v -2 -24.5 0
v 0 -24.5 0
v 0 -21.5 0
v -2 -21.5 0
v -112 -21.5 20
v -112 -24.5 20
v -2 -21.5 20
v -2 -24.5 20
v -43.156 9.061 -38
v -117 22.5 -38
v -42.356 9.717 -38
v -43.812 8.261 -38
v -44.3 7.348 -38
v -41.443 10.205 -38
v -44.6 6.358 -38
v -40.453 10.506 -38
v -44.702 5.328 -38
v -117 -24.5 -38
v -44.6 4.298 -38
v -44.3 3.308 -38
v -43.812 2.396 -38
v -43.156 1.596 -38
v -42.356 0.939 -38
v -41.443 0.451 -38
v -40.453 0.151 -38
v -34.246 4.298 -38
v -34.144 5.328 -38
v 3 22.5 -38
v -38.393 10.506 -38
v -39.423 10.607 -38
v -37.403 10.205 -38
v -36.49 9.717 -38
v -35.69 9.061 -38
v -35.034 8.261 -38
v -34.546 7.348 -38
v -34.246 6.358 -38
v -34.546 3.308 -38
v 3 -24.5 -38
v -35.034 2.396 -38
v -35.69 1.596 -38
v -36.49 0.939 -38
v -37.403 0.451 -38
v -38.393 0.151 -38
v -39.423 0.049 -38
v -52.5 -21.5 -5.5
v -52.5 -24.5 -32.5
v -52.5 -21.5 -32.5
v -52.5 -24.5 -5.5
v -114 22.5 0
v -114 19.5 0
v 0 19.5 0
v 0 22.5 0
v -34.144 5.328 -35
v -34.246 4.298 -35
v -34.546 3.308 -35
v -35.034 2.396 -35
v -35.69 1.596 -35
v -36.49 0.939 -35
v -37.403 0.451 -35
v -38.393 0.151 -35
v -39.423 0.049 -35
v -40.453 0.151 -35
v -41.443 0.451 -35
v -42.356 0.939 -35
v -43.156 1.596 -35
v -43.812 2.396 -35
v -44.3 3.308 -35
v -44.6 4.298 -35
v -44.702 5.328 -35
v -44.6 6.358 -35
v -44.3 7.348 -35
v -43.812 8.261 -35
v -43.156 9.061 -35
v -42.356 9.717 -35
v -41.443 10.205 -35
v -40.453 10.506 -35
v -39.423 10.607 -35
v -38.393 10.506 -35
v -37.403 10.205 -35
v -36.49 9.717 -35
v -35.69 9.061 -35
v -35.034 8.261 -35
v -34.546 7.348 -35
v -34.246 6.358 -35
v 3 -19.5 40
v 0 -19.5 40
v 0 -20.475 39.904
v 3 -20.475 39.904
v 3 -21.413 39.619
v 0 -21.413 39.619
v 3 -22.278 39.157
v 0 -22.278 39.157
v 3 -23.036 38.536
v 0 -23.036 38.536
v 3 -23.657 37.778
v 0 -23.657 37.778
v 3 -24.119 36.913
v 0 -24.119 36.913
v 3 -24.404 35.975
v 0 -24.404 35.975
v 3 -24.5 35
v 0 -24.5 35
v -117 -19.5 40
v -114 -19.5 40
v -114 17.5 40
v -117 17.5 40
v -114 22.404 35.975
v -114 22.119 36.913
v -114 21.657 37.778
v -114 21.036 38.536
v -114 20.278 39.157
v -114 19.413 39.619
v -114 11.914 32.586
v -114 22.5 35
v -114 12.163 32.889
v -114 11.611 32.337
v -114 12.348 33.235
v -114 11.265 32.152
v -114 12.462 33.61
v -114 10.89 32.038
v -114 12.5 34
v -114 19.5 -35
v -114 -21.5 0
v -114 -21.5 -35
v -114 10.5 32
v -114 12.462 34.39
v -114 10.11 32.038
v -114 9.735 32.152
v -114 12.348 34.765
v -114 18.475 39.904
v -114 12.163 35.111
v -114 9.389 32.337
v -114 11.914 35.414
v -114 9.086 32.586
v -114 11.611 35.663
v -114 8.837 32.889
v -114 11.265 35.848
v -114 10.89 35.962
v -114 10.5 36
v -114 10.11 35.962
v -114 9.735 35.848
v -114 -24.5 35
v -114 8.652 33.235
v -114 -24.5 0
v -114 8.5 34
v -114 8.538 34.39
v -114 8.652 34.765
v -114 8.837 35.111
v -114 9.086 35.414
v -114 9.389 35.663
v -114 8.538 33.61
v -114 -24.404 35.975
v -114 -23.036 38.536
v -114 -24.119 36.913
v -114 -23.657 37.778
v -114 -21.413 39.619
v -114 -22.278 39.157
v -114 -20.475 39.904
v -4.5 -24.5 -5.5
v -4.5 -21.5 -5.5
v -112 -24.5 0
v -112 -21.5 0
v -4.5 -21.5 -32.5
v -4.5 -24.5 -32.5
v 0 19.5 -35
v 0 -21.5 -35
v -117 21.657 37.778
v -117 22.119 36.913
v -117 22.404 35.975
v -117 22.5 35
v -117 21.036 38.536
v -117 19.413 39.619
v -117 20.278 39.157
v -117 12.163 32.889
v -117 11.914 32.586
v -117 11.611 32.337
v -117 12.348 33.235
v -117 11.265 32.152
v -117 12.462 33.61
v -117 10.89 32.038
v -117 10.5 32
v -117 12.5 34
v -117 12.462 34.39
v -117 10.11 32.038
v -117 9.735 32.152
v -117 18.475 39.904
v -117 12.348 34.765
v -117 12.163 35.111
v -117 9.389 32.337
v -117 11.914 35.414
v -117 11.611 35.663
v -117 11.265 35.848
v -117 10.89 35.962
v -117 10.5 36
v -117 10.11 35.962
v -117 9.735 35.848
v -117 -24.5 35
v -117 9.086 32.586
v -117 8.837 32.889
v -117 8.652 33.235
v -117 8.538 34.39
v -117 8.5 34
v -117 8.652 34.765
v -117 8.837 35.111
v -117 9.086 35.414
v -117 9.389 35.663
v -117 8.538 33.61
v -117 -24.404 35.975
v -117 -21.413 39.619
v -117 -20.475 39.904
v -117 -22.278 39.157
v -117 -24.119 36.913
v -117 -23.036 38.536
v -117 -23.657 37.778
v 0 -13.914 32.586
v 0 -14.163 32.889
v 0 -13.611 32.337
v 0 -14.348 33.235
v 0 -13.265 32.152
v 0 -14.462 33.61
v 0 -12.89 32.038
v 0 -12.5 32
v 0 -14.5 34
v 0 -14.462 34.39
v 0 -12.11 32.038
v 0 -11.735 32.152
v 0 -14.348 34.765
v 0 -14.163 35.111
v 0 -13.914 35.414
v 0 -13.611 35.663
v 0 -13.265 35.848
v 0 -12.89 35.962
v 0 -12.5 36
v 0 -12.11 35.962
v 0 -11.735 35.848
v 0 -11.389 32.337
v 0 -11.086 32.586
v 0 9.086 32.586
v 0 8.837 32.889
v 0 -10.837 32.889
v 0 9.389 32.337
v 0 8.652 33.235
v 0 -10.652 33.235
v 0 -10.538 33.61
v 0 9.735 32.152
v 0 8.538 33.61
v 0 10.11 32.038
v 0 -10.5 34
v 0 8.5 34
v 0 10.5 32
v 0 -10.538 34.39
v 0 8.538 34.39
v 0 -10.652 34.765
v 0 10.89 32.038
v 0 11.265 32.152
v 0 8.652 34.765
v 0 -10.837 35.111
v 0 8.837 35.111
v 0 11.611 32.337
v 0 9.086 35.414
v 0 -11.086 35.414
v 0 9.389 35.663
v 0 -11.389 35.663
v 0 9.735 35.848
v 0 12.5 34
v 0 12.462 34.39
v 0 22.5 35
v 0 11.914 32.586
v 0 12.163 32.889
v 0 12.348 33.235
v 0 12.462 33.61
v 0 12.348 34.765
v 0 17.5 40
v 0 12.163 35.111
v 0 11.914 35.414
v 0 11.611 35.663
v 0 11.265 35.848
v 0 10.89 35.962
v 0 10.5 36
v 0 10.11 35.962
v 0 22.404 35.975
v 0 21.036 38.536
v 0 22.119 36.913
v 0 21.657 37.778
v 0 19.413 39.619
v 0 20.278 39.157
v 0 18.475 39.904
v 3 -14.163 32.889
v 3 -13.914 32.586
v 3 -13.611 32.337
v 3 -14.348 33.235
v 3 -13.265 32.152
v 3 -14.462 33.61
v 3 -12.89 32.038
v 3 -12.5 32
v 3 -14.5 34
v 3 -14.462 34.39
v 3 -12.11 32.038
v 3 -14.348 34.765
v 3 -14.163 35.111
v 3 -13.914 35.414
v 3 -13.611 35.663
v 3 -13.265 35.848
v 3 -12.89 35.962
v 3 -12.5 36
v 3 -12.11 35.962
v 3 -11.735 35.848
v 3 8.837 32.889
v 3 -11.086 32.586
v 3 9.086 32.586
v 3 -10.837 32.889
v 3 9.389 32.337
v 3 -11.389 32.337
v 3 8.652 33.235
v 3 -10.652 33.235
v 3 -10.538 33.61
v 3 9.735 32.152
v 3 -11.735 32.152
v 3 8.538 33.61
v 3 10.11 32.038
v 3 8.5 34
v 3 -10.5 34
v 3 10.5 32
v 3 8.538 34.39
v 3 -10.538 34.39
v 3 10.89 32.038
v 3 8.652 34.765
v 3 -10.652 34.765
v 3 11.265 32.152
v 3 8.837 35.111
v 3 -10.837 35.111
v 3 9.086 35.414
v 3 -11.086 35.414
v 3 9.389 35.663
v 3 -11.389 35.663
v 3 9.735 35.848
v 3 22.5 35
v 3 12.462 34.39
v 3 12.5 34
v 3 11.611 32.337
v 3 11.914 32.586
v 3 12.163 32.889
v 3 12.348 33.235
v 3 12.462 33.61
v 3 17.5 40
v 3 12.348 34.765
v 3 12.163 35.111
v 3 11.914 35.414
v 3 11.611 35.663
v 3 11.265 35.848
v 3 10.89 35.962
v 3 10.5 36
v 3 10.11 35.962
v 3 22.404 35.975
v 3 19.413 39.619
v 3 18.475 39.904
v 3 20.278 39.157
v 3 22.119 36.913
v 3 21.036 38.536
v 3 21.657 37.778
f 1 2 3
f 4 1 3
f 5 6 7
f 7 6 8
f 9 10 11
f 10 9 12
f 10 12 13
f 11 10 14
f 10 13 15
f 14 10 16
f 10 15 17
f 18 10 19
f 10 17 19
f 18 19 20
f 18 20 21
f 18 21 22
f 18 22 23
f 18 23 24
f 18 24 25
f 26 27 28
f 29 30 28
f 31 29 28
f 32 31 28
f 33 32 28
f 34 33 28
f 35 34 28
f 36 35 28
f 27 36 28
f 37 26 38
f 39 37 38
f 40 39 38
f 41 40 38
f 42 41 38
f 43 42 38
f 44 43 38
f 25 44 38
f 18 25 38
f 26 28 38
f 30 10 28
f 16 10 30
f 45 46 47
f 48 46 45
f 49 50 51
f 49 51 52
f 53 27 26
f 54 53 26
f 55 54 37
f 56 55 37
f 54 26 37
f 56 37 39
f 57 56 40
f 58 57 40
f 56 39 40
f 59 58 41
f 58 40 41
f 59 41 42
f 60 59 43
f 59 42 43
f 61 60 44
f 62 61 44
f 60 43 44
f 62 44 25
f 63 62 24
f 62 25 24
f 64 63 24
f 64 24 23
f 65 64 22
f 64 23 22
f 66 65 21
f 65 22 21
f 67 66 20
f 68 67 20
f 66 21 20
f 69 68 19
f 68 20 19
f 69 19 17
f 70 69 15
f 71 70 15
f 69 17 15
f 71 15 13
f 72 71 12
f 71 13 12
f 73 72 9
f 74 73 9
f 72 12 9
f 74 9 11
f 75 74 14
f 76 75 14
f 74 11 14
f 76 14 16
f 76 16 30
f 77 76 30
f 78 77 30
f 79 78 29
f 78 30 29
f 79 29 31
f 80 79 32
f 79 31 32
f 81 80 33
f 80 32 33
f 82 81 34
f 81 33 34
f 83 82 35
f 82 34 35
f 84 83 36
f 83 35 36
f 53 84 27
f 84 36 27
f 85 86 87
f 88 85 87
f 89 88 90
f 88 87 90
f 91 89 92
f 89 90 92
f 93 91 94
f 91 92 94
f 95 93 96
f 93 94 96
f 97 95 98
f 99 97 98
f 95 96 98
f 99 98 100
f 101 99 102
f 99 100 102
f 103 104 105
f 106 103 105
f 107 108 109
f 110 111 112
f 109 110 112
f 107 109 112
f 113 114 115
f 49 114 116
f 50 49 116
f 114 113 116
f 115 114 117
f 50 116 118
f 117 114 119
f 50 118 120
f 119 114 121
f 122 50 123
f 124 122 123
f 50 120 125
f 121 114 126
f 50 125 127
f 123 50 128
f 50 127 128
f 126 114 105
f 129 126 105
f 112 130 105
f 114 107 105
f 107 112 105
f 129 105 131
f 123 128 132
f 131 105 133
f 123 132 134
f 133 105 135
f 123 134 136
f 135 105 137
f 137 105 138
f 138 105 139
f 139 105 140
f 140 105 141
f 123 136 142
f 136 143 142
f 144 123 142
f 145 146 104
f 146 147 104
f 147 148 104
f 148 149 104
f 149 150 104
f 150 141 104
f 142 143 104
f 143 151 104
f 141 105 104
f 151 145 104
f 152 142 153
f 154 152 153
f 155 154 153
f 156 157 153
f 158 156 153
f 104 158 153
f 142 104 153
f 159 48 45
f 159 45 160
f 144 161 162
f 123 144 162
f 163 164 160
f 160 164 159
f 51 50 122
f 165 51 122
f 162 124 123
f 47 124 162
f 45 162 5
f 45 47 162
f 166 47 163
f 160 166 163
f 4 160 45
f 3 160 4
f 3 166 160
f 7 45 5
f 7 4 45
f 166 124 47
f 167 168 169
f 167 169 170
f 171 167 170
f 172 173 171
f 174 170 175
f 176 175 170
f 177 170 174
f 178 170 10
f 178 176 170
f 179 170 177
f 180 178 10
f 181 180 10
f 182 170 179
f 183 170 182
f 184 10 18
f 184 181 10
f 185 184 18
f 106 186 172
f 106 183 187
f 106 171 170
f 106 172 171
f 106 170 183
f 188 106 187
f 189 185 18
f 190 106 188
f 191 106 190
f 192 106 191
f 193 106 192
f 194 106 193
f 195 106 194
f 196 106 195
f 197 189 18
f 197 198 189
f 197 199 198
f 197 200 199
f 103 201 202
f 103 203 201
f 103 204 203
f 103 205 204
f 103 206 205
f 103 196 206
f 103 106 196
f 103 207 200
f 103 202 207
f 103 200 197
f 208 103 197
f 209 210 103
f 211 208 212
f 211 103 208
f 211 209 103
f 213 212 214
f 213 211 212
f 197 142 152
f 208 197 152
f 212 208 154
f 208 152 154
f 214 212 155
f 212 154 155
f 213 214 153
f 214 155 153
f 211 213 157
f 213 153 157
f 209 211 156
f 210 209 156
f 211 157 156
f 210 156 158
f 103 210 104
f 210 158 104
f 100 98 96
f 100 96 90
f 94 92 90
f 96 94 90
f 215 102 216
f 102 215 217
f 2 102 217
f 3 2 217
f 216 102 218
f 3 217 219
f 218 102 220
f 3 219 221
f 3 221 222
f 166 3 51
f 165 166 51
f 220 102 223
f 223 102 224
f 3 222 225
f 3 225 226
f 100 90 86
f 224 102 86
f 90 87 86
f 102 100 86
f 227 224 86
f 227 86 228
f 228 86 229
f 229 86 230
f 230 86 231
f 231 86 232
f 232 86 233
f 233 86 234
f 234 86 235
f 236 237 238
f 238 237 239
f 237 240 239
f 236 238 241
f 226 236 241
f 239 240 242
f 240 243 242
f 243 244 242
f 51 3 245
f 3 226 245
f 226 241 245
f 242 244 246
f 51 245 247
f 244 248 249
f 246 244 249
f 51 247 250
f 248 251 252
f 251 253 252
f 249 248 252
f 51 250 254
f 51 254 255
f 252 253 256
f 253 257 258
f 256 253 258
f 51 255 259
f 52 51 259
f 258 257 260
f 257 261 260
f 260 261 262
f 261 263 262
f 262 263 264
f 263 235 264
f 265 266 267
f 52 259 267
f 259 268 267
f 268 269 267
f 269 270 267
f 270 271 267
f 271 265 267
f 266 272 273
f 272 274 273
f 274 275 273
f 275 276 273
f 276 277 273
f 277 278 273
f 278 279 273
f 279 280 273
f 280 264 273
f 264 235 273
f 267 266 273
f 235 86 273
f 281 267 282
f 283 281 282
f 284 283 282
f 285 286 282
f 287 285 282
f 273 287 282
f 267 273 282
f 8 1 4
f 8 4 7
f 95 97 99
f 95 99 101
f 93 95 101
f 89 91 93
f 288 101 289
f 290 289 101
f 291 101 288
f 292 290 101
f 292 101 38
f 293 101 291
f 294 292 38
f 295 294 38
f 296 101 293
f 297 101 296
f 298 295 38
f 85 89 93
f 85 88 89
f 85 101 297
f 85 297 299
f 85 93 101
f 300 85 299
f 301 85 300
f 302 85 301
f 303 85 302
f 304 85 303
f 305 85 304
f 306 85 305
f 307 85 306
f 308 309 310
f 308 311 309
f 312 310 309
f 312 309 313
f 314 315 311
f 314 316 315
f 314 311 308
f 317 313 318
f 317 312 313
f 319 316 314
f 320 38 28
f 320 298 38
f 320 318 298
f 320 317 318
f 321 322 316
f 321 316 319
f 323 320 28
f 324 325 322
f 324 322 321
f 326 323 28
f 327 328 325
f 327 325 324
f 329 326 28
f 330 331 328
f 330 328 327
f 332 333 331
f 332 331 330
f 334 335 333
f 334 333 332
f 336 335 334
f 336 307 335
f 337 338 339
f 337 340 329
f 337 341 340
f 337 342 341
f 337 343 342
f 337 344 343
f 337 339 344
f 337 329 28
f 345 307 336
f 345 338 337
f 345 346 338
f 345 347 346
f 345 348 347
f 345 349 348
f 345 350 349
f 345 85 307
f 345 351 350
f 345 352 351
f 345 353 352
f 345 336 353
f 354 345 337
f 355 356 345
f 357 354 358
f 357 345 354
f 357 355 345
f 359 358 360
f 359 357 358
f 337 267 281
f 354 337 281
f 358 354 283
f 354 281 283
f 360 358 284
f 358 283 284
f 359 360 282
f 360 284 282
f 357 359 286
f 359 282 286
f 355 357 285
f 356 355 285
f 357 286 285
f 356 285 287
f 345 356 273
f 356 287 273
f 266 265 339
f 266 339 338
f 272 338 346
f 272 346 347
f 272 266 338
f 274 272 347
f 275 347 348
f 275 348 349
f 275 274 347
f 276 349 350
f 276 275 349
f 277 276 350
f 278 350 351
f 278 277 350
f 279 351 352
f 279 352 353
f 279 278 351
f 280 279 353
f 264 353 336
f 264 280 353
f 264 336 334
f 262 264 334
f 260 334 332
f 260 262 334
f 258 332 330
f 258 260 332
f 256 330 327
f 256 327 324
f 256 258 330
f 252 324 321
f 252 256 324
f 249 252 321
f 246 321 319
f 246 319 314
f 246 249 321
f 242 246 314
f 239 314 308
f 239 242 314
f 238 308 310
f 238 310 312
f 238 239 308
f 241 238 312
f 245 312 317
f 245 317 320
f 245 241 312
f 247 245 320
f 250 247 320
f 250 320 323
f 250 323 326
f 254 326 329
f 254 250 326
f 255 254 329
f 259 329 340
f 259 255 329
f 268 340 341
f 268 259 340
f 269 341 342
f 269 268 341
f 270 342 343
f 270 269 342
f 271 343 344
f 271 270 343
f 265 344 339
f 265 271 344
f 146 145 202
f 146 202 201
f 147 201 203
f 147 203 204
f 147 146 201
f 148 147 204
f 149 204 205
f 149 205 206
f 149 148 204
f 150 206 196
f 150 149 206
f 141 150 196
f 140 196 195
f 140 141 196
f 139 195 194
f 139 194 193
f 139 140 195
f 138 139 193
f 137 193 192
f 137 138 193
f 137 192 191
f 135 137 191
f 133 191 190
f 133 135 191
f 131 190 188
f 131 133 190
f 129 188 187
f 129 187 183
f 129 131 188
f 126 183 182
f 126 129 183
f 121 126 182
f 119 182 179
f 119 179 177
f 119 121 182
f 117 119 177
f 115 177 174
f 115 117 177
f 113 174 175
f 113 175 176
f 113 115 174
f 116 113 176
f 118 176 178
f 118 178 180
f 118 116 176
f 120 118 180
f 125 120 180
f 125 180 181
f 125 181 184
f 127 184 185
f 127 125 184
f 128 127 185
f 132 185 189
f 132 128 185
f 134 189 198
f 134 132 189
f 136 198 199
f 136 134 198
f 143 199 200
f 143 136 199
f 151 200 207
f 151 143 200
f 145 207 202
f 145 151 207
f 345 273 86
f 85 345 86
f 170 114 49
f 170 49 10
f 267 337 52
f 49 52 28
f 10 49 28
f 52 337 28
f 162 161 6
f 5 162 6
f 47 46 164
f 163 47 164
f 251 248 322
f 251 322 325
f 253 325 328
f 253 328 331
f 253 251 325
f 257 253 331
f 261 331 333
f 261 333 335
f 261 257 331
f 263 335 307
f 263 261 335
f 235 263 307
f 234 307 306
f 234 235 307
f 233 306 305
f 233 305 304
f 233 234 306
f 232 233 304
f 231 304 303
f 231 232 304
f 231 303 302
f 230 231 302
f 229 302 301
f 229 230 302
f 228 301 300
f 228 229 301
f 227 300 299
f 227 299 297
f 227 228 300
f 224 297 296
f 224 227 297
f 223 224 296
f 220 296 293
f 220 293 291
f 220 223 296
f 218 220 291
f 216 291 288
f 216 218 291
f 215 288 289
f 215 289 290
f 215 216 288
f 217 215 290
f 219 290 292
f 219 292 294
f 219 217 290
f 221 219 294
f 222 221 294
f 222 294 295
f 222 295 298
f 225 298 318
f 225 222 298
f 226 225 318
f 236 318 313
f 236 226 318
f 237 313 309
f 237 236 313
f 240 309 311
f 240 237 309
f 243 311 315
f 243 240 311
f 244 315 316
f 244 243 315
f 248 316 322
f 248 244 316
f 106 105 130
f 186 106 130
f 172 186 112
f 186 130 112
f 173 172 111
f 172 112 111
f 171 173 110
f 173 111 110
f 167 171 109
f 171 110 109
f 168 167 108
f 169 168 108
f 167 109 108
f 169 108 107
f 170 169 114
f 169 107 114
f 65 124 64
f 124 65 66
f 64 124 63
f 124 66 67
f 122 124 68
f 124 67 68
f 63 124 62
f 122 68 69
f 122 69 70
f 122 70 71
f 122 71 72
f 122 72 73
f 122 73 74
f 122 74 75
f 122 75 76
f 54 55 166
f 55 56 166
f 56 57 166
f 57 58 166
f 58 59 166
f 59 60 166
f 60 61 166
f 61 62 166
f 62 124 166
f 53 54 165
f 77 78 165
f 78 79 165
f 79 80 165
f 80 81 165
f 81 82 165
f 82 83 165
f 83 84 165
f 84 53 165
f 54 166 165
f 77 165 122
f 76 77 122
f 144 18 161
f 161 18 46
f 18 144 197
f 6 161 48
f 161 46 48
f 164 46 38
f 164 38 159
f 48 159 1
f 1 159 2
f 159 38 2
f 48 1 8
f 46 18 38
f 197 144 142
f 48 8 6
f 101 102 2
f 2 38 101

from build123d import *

# Parameters (mm, degrees)
F2_R      = 2
F3_DEPTH  = 3
F4_W      = 3
F4_H      = 35
F4_H_2    = 3
F4_W_2    = 41
F5_DEPTH  = 114
F6_R      = 2
F7_DEPTH  = 3
F8_W      = 110
F8_H      = 20
F9_DEPTH  = 3
F10_W     = 48
F10_H     = 27
F11_DEPTH = 3
F12_R     = 5.2787577195
F13_DEPTH = 3


with BuildPart() as f3:
    # F2 (on Right) → F3 (new body)
    with BuildSketch(Plane.YZ):
        with BuildLine():
            ThreePointArc((22.5, 35), (21.0355339059, 38.5355339059), (17.5, 40))
            Line((17.5, 40), (-19.5, 40))
            ThreePointArc((-19.5, 40), (-23.0355339059, 38.5355339059), (-24.5, 35))
            Line((-24.5, 35), (-24.5, -38))
            Line((-24.5, -38), (22.5, -38))
            Line((22.5, -38), (22.5, 35))
        make_face()
        with Locations((-12.5, 34)):
            Circle(F2_R, mode=Mode.SUBTRACT)
        with Locations((10.5, 34)):
            Circle(F2_R, mode=Mode.SUBTRACT)
    extrude(amount=F3_DEPTH)

    # F4 (on Right) → F5 (join)
    with BuildSketch(Plane.YZ):
        with Locations((-23, -17.5)):
            Rectangle(F4_W, F4_H)
        with Locations((21, -36.5)):
            Rectangle(F4_W, F4_H_2)
        with Locations((21, -17.5)):
            Rectangle(F4_W, F4_H)
        with Locations((-1, -36.5)):
            Rectangle(F4_W_2, F4_H_2)
        with Locations((-23, -36.5)):
            Rectangle(F4_W, F4_H_2)
    extrude(amount=-F5_DEPTH)

    # F6 (on face) → F7 (join)
    with BuildSketch(Plane(origin=(-114, 0, 0), x_dir=(0, -1, 0), z_dir=(-1, 0, 0))):
        with BuildLine():
            ThreePointArc((24.5, 35), (23.0355339059, 38.5355339059), (19.5, 40))
            Line((19.5, 40), (-17.5, 40))
            ThreePointArc((-17.5, 40), (-21.0355339059, 38.5355339059), (-22.5, 35))
            Line((-22.5, 35), (-22.5, -38))
            Line((-22.5, -38), (24.5, -38))
            Line((24.5, -38), (24.5, 35))
        make_face()
        with Locations((-10.5, 34)):
            Circle(F6_R, mode=Mode.SUBTRACT)
    extrude(amount=F7_DEPTH)

    # F8 (on face) → F9 (join)
    with BuildSketch(Plane.XZ.offset(24.5)):
        with Locations((-57, 10)):
            Rectangle(F8_W, F8_H)
    extrude(amount=-F9_DEPTH)

    # F10 (on face) → F11 (cut, through all)
    with BuildSketch(Plane.XZ.offset(24.5)):
        with Locations((-28.5, -19)):
            Rectangle(F10_W, F10_H)
    extrude(amount=-F11_DEPTH, mode=Mode.SUBTRACT)

    # F12 (on face) → F13 (cut, through all)
    with BuildSketch(Plane(origin=(0, 0, -38), x_dir=(1, 0, 0), z_dir=(0, 0, -1))):
        with Locations((-39.4231006503, -5.3282435983)):
            Circle(F12_R)
    extrude(amount=-F13_DEPTH, mode=Mode.SUBTRACT)


solid = f3.part
